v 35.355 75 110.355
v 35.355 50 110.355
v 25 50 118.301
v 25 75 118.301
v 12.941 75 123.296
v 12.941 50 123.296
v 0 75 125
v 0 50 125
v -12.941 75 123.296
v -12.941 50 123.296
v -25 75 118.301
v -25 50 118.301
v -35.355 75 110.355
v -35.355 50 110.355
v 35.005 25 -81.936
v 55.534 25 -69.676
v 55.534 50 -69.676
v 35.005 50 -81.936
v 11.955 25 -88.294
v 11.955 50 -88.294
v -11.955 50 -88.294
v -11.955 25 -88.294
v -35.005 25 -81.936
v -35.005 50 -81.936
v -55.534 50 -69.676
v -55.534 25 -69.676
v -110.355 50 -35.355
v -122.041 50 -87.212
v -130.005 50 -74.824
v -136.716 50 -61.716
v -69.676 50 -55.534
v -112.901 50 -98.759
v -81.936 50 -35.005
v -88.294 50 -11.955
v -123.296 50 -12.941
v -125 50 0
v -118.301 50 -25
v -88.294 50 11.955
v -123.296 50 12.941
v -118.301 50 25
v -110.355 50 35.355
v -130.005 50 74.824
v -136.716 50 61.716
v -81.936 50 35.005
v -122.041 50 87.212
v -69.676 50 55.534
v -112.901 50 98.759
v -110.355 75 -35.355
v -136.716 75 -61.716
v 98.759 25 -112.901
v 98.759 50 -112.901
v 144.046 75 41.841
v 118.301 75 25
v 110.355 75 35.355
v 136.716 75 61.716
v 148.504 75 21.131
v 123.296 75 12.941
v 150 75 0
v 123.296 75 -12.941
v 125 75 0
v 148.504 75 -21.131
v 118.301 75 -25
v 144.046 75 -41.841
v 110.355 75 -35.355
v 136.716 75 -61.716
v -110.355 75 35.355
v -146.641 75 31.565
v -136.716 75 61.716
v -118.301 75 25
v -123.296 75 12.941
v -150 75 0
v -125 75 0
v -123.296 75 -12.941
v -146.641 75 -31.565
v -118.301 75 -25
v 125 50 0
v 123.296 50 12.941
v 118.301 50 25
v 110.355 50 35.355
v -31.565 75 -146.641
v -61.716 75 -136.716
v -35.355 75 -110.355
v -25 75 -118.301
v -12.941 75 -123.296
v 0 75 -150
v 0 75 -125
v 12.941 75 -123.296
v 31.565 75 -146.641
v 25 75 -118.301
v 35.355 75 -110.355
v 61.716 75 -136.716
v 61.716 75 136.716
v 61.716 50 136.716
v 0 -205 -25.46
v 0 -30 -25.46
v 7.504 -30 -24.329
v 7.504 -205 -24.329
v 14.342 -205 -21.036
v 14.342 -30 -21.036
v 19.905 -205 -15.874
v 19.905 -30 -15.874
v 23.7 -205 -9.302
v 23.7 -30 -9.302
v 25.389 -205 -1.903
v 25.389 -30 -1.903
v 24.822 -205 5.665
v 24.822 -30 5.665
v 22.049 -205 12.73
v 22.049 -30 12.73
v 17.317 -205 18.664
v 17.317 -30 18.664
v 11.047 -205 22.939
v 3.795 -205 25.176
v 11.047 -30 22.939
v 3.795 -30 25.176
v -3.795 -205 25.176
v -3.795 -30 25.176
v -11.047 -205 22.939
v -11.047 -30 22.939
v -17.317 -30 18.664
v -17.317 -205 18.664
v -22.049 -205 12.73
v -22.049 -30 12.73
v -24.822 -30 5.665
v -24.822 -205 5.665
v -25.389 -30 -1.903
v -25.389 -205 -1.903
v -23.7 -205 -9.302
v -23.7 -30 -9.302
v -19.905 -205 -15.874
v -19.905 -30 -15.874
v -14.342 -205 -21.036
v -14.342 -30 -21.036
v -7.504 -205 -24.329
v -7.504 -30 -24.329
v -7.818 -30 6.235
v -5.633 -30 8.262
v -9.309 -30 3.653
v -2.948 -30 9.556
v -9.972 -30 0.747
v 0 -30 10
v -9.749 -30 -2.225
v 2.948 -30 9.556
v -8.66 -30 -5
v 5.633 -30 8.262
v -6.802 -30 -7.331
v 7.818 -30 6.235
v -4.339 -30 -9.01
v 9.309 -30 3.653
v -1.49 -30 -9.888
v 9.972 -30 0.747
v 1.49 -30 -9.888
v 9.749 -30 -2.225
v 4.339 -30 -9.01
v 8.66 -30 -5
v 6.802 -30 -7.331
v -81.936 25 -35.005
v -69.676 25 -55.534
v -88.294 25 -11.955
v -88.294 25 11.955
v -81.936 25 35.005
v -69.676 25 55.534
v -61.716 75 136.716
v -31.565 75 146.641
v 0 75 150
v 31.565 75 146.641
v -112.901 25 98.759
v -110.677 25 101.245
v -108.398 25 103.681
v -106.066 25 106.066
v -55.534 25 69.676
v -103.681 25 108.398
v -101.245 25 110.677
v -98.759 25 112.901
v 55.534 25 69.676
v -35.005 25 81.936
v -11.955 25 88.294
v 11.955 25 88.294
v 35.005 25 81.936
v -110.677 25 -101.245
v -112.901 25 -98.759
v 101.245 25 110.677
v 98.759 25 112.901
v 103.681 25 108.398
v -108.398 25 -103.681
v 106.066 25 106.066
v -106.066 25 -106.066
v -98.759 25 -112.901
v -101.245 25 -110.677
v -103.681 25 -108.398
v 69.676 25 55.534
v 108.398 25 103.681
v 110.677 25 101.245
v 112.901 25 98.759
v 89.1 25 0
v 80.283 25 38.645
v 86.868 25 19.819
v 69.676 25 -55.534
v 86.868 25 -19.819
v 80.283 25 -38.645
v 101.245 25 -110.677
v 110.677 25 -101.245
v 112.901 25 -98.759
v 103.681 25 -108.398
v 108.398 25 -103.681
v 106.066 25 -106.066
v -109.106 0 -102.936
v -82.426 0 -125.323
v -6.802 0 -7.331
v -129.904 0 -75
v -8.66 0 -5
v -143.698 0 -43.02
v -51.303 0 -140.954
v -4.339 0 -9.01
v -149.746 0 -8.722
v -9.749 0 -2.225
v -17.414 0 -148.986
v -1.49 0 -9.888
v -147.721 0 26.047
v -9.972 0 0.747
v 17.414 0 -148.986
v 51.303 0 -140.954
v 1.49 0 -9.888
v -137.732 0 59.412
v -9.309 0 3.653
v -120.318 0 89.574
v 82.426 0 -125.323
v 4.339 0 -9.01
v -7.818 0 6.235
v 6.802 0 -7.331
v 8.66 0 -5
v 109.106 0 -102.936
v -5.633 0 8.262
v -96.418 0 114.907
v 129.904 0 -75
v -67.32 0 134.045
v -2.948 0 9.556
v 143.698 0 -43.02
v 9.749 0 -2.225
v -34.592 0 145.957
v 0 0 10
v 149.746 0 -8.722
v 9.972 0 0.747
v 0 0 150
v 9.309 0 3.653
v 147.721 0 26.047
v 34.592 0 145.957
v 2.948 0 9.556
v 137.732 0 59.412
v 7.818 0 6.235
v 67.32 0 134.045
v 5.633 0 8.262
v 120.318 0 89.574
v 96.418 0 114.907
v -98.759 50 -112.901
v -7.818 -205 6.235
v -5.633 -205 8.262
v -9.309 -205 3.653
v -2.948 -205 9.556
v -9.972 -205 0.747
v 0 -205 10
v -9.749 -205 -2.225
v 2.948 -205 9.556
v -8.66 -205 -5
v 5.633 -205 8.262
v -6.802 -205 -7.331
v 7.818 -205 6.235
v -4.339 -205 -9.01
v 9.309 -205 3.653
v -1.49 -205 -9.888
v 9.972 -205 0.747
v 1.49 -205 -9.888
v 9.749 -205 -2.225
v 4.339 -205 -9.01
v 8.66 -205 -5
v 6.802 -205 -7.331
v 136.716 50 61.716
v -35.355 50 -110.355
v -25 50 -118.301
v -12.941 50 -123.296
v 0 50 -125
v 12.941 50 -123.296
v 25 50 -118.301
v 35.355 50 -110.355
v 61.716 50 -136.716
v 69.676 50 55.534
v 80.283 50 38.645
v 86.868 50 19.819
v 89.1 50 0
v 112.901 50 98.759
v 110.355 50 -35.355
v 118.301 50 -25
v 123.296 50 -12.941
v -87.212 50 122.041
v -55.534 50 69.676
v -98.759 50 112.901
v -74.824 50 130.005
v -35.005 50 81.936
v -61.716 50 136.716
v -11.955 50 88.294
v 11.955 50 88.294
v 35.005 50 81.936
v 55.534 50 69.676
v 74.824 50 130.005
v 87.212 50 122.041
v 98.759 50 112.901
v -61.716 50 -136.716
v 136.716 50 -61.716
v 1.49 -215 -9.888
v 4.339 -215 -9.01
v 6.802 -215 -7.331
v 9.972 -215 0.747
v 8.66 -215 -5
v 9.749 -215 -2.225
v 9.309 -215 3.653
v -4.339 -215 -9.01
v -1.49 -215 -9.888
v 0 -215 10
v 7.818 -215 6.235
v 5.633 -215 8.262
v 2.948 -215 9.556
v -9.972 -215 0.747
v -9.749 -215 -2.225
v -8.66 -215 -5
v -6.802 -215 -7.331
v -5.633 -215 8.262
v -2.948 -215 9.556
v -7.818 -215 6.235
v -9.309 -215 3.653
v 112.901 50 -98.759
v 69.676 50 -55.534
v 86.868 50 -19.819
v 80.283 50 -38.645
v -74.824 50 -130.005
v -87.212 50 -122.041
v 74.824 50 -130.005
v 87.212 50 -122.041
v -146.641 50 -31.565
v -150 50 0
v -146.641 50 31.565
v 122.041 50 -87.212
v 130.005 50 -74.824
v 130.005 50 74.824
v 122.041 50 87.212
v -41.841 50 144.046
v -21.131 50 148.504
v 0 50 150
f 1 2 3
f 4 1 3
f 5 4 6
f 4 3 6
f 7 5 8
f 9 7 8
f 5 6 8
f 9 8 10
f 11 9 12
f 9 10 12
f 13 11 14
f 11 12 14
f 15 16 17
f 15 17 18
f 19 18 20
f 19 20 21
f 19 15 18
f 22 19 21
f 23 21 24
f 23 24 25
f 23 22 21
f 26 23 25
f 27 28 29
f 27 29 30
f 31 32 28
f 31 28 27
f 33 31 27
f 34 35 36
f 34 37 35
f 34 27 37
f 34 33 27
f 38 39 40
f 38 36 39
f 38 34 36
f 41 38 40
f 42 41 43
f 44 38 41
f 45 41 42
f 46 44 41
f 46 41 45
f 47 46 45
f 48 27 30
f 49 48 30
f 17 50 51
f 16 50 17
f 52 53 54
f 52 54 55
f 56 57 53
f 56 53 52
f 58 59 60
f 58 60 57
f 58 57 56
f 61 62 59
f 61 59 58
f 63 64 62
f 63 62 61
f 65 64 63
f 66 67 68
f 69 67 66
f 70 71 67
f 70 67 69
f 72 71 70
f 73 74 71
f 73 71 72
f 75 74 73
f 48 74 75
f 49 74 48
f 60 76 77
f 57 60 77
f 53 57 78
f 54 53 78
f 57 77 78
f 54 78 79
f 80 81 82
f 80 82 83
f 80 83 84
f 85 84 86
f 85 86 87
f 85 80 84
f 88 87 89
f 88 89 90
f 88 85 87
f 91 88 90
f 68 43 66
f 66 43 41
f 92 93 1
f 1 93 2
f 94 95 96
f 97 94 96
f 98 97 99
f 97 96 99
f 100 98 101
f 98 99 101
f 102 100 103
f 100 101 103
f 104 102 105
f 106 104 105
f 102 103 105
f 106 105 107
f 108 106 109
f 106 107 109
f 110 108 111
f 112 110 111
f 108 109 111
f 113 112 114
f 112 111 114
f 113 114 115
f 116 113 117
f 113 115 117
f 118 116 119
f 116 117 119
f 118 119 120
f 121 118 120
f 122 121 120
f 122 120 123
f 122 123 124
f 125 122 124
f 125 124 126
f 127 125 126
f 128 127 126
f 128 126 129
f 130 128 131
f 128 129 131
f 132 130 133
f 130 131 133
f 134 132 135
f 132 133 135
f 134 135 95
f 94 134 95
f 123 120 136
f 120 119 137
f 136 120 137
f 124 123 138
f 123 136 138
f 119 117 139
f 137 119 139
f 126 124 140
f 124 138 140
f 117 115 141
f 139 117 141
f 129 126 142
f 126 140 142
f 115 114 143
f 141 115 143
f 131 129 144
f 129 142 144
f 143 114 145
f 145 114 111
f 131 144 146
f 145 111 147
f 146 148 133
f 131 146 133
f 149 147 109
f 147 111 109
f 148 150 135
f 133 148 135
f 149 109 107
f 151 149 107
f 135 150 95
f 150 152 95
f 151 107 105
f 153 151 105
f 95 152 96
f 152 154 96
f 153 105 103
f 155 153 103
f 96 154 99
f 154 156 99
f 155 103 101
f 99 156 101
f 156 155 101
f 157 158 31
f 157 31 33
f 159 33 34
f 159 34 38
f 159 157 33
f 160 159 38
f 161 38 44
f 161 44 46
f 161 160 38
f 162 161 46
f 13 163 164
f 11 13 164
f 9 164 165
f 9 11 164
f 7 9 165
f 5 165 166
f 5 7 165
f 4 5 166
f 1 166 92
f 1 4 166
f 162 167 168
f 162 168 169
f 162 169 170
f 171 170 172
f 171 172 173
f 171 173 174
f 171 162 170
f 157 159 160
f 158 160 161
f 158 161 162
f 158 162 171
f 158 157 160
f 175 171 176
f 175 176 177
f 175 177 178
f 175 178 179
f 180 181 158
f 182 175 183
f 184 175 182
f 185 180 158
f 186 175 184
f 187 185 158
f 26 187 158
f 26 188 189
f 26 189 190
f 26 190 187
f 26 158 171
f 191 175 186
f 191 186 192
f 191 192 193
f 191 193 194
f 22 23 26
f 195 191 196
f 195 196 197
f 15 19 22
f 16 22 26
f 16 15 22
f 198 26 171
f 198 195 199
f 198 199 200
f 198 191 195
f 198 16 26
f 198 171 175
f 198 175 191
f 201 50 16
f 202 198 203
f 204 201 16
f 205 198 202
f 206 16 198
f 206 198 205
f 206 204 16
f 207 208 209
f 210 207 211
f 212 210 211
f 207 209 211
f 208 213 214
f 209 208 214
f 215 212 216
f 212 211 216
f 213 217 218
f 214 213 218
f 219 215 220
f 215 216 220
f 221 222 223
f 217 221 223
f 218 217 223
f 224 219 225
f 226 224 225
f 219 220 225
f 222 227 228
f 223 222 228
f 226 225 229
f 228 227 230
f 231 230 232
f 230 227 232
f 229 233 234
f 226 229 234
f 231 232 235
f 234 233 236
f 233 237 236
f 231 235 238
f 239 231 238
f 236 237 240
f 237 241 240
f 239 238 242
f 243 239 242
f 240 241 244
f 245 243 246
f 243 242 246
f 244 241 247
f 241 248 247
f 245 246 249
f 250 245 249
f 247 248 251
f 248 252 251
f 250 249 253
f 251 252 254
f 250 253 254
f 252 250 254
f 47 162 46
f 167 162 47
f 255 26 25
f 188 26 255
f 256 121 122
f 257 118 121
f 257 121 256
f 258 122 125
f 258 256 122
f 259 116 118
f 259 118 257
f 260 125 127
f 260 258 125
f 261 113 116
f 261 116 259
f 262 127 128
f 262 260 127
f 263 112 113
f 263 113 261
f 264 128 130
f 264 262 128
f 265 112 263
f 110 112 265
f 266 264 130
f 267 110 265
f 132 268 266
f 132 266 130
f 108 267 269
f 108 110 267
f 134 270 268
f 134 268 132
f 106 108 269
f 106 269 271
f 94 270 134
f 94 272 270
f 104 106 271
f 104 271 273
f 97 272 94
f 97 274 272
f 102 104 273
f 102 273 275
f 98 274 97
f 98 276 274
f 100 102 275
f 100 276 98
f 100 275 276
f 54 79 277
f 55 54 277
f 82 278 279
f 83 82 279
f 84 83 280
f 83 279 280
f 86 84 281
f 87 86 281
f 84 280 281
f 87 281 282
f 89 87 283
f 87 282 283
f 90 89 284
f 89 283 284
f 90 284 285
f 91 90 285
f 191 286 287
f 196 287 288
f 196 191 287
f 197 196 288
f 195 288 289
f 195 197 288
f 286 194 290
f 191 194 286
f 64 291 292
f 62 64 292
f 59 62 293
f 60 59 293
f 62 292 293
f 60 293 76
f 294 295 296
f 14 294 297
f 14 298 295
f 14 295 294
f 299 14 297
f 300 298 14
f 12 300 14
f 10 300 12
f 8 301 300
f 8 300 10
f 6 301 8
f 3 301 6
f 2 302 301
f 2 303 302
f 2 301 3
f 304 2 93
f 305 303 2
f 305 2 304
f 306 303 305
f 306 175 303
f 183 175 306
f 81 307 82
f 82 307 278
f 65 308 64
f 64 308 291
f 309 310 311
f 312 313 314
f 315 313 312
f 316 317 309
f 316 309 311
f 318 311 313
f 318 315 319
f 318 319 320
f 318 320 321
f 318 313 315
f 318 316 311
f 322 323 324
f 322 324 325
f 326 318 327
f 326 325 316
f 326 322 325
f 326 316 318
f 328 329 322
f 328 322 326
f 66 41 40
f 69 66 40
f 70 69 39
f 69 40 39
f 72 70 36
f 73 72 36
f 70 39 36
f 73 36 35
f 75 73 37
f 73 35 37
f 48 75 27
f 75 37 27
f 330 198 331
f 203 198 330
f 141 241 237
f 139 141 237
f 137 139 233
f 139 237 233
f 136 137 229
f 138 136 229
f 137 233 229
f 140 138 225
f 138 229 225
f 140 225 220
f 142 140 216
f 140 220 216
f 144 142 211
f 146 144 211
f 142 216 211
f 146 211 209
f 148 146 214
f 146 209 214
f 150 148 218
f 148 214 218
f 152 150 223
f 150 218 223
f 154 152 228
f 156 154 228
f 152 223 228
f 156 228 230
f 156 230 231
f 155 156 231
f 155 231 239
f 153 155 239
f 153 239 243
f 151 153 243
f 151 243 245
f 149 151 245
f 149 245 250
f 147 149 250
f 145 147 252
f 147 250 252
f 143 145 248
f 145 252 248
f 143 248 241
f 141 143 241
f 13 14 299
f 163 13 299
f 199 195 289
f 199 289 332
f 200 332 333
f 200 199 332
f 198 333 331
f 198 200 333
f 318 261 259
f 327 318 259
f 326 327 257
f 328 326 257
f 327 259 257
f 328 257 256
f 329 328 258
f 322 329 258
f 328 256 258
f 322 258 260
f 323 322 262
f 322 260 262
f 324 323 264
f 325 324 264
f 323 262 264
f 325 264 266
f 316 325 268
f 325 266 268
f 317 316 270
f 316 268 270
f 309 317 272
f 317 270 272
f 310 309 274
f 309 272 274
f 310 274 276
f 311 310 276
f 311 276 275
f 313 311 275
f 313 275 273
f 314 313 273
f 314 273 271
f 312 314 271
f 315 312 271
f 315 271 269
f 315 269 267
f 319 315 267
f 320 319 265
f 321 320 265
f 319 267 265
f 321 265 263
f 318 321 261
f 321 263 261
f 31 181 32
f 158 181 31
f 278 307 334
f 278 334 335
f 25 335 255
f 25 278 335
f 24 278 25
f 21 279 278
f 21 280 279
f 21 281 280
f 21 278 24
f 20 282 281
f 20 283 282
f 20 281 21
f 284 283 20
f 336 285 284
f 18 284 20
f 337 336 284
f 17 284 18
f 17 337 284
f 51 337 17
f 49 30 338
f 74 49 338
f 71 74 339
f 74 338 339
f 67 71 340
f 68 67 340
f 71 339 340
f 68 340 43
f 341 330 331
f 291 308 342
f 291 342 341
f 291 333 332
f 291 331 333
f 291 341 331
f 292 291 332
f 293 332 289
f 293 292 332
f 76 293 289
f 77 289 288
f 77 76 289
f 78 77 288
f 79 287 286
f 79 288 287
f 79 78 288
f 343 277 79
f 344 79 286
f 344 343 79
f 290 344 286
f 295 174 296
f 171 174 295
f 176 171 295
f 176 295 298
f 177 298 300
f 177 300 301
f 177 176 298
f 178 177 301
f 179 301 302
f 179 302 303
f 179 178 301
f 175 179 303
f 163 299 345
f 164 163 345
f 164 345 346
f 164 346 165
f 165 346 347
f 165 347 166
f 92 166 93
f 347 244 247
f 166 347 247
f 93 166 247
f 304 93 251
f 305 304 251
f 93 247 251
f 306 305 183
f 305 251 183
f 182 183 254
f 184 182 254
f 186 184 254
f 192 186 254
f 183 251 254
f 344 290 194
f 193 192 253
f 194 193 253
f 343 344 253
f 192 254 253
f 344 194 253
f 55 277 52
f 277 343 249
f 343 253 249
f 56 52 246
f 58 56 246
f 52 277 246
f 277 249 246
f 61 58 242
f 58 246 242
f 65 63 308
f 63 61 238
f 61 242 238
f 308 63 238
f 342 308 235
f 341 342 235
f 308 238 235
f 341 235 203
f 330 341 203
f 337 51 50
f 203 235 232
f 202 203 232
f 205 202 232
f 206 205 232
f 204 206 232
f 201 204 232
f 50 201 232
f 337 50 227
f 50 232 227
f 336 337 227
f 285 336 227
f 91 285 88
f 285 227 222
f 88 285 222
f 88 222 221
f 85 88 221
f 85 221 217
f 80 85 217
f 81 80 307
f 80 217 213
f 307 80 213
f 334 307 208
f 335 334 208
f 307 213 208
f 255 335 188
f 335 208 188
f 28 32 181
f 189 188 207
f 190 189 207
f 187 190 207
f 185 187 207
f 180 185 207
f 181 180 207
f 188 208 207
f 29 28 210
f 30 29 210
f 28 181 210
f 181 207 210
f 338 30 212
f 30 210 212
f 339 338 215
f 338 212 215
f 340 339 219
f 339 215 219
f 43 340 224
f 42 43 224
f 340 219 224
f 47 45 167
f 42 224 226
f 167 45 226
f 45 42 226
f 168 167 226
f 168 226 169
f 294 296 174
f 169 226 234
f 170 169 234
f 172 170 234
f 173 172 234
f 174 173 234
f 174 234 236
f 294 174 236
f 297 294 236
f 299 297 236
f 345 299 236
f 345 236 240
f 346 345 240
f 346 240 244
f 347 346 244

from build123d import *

# Parameters (mm, degrees)
SKETCH_1_R          = 150
EXTRUDE_1_DEPTH     = 50
CUT_EXTRUDE_START   = -25
CUT_EXTRUDE_1_DEPTH = 25
EXTRUDE_2_DEPTH     = 25
SKETCH_4_R          = 10
EXTRUDE_3_DEPTH     = 30
SKETCH_5_R          = 25.46
EXTRUDE_4_DEPTH     = 175
SKETCH_6_R          = 10
EXTRUDE_5_DEPTH     = 10


with BuildPart() as part:
    # 草图1 → 凸台-拉伸1 (new body)
    with BuildSketch(Plane(origin=(0, 0, 0), x_dir=(1, 0, 0), z_dir=(0, 1, 0))):
        with Locations(Location((0, 0, 0), (0, 0, 270))):
            Circle(SKETCH_1_R)
    extrude(amount=EXTRUDE_1_DEPTH)

    # 草图2 → 切除-拉伸1 (cut)
    with BuildSketch(Plane(origin=(0, 50, 0), x_dir=(1, 0, 0), z_dir=(0, 1, 0)).offset(CUT_EXTRUDE_START)):
        with BuildLine():
            Line((106.066017178, -106.066017178), (63.003214204, -63.003214204))
            ThreePointArc((63.003214204, -63.003214204), (59.362488155, -66.444751486), (55.534083733, -69.676219357))
            Line((55.534083733, -69.676219357), (98.758984631, -112.901120254))
            ThreePointArc((98.758984631, -112.901120254), (102.46950766, -109.544511501), (106.066017178, -106.066017178))
        make_face()
        with BuildLine():
            ThreePointArc((69.676219357, -55.534083733), (66.444751486, -59.362488155), (63.003214204, -63.003214204))
            Line((63.003214204, -63.003214204), (106.066017178, -106.066017178))
            ThreePointArc((106.066017178, -106.066017178), (109.544511501, -102.46950766), (112.901120254, -98.758984631))
            Line((112.901120254, -98.758984631), (69.676219357, -55.534083733))
        make_face()
        with BuildLine():
            Line((14.142135624, 0), (7.071067812, -7.071067812))
            Line((7.071067812, -7.071067812), (63.003214204, -63.003214204))
            ThreePointArc((63.003214204, -63.003214204), (66.444751486, -59.362488155), (69.676219357, -55.534083733))
            Line((69.676219357, -55.534083733), (14.142135624, 0))
        make_face()
        with BuildLine():
            Line((63.003214204, -63.003214204), (7.071067812, -7.071067812))
            Line((7.071067812, -7.071067812), (0, -14.142135624))
            Line((0, -14.142135624), (55.534083733, -69.676219357))
            ThreePointArc((55.534083733, -69.676219357), (59.362488155, -66.444751486), (63.003214204, -63.003214204))
        make_face()
        with BuildLine():
            Line((55.534083733, -69.676219357), (0, -14.142135624))
            Line((0, -14.142135624), (-55.534083733, -69.676219357))
            ThreePointArc((-55.534083733, -69.676219357), (0, -89.1), (55.534083733, -69.676219357))
        make_face()
        with BuildLine():
            Line((0, -14.142135624), (-7.071067812, -7.071067812))
            Line((-7.071067812, -7.071067812), (-63.003214204, -63.003214204))
            ThreePointArc((-63.003214204, -63.003214204), (-59.362488155, -66.444751486), (-55.534083733, -69.676219357))
            Line((-55.534083733, -69.676219357), (0, -14.142135624))
        make_face()
        with BuildLine():
            Line((-63.003214204, -63.003214204), (-7.071067812, -7.071067812))
            Line((-7.071067812, -7.071067812), (-14.142135624, 0))
            Line((-14.142135624, 0), (-69.676219357, -55.534083733))
            ThreePointArc((-69.676219357, -55.534083733), (-66.444751486, -59.362488155), (-63.003214204, -63.003214204))
        make_face()
        with BuildLine():
            Line((106.066017178, 106.066017178), (63.003214204, 63.003214204))
            ThreePointArc((63.003214204, 63.003214204), (66.444751486, 59.362488155), (69.676219357, 55.534083733))
            Line((69.676219357, 55.534083733), (112.901120254, 98.758984631))
            ThreePointArc((112.901120254, 98.758984631), (109.544511501, 102.46950766), (106.066017178, 106.066017178))
        make_face()
        with BuildLine():
            ThreePointArc((-55.534083733, -69.676219357), (-59.362488155, -66.444751486), (-63.003214204, -63.003214204))
            Line((-63.003214204, -63.003214204), (-106.066017178, -106.066017178))
            ThreePointArc((-106.066017178, -106.066017178), (-102.46950766, -109.544511501), (-98.758984631, -112.901120254))
            Line((-98.758984631, -112.901120254), (-55.534083733, -69.676219357))
        make_face()
        with BuildLine():
            ThreePointArc((55.534083733, 69.676219357), (59.362488155, 66.444751486), (63.003214204, 63.003214204))
            Line((63.003214204, 63.003214204), (106.066017178, 106.066017178))
            ThreePointArc((106.066017178, 106.066017178), (102.46950766, 109.544511501), (98.758984631, 112.901120254))
            Line((98.758984631, 112.901120254), (55.534083733, 69.676219357))
        make_face()
        with BuildLine():
            Line((-106.066017178, -106.066017178), (-63.003214204, -63.003214204))
            ThreePointArc((-63.003214204, -63.003214204), (-66.444751486, -59.362488155), (-69.676219357, -55.534083733))
            Line((-69.676219357, -55.534083733), (-112.901120254, -98.758984631))
            ThreePointArc((-112.901120254, -98.758984631), (-109.544511501, -102.46950766), (-106.066017178, -106.066017178))
        make_face()
        with BuildLine():
            Line((-69.676219357, -55.534083733), (-14.142135624, 0))
            Line((-14.142135624, 0), (-69.676219357, 55.534083733))
            ThreePointArc((-69.676219357, 55.534083733), (-89.1, 0), (-69.676219357, -55.534083733))
        make_face()
        with BuildLine():
            Line((-14.142135624, 0), (-7.071067812, 7.071067812))
            Line((-7.071067812, 7.071067812), (-63.003214204, 63.003214204))
            ThreePointArc((-63.003214204, 63.003214204), (-66.444751486, 59.362488155), (-69.676219357, 55.534083733))
            Line((-69.676219357, 55.534083733), (-14.142135624, 0))
        make_face()
        with BuildLine():
            Line((-63.003214204, 63.003214204), (-7.071067812, 7.071067812))
            Line((-7.071067812, 7.071067812), (0, 14.142135624))
            Line((0, 14.142135624), (-55.534083733, 69.676219357))
            ThreePointArc((-55.534083733, 69.676219357), (-59.362488155, 66.444751486), (-63.003214204, 63.003214204))
        make_face()
        Polygon((7.071067812, -7.071067812), (0, 0), (-7.071067812, -7.071067812), (0, -14.142135624), align=None)
        Polygon((-7.071067812, -7.071067812), (0, 0), (-7.071067812, 7.071067812), (-14.142135624, 0), align=None)
        Polygon((7.071067812, 7.071067812), (0, 0), (14.142135624, 0), align=None)
        Polygon((14.142135624, 0), (0, 0), (7.071067812, -7.071067812), align=None)
        Polygon((-7.071067812, 7.071067812), (0, 0), (7.071067812, 7.071067812), (0, 14.142135624), align=None)
        with BuildLine():
            Line((0, 14.142135624), (7.071067812, 7.071067812))
            Line((7.071067812, 7.071067812), (63.003214204, 63.003214204))
            ThreePointArc((63.003214204, 63.003214204), (59.362488155, 66.444751486), (55.534083733, 69.676219357))
            Line((55.534083733, 69.676219357), (0, 14.142135624))
        make_face()
        with BuildLine():
            Line((63.003214204, 63.003214204), (7.071067812, 7.071067812))
            Line((7.071067812, 7.071067812), (14.142135624, 0))
            Line((14.142135624, 0), (69.676219357, 55.534083733))
            ThreePointArc((69.676219357, 55.534083733), (66.444751486, 59.362488155), (63.003214204, 63.003214204))
        make_face()
        with BuildLine():
            ThreePointArc((-69.676219357, 55.534083733), (-66.444751486, 59.362488155), (-63.003214204, 63.003214204))
            Line((-63.003214204, 63.003214204), (-106.066017178, 106.066017178))
            ThreePointArc((-106.066017178, 106.066017178), (-109.544511501, 102.46950766), (-112.901120254, 98.758984631))
            Line((-112.901120254, 98.758984631), (-69.676219357, 55.534083733))
        make_face()
        with BuildLine():
            Line((-106.066017178, 106.066017178), (-63.003214204, 63.003214204))
            ThreePointArc((-63.003214204, 63.003214204), (-59.362488155, 66.444751486), (-55.534083733, 69.676219357))
            Line((-55.534083733, 69.676219357), (-98.758984631, 112.901120254))
            ThreePointArc((-98.758984631, 112.901120254), (-102.46950766, 109.544511501), (-106.066017178, 106.066017178))
        make_face()
        with BuildLine():
            Line((69.676219357, 55.534083733), (14.142135624, 0))
            Line((14.142135624, 0), (89.1, 0))
            ThreePointArc((89.1, 0), (84.103986662, 29.416482245), (69.676219357, 55.534083733))
        make_face()
        with BuildLine():
            Line((89.1, 0), (14.142135624, 0))
            Line((14.142135624, 0), (69.676219357, -55.534083733))
            ThreePointArc((69.676219357, -55.534083733), (84.103986662, -29.416482245), (89.1, 0))
        make_face()
        with BuildLine():
            Line((-55.534083733, 69.676219357), (0, 14.142135624))
            Line((0, 14.142135624), (55.534083733, 69.676219357))
            ThreePointArc((55.534083733, 69.676219357), (0, 89.1), (-55.534083733, 69.676219357))
        make_face()
    extrude(amount=CUT_EXTRUDE_1_DEPTH, mode=Mode.SUBTRACT)

    # 草图3 → 凸台-拉伸2 (add)
    with BuildSketch(Plane(origin=(0, 50, 0), x_dir=(1, 0, 0), z_dir=(0, 1, 0))):
        with BuildLine():
            Line((-136.715674165, -61.715674165), (-110.355339059, -35.355339059))
            ThreePointArc((-110.355339059, -35.355339059), (-125, 0), (-110.355339059, 35.355339059))
            Line((-110.355339059, 35.355339059), (-136.715674165, 61.715674165))
            ThreePointArc((-136.715674165, 61.715674165), (-150, 0), (-136.715674165, -61.715674165))
        make_face()
        with BuildLine():
            Line((35.355339059, 110.355339059), (61.715674165, 136.715674165))
            ThreePointArc((61.715674165, 136.715674165), (0, 150), (-61.715674165, 136.715674165))
            Line((-61.715674165, 136.715674165), (-35.355339059, 110.355339059))
            ThreePointArc((-35.355339059, 110.355339059), (0, 125), (35.355339059, 110.355339059))
        make_face()
        with BuildLine():
            Line((136.715674165, 61.715674165), (110.355339059, 35.355339059))
            ThreePointArc((110.355339059, 35.355339059), (121.193976626, 19.134171618), (125, 0))
            ThreePointArc((125, 0), (121.193976626, -19.134171618), (110.355339059, -35.355339059))
            Line((110.355339059, -35.355339059), (136.715674165, -61.715674165))
            ThreePointArc((136.715674165, -61.715674165), (146.641316014, -31.564607357), (150, 0))
            ThreePointArc((150, 0), (146.641316014, 31.564607357), (136.715674165, 61.715674165))
        make_face()
        with BuildLine():
            Line((61.715674165, -136.715674165), (35.355339059, -110.355339059))
            ThreePointArc((35.355339059, -110.355339059), (0, -125), (-35.355339059, -110.355339059))
            Line((-35.355339059, -110.355339059), (-61.715674165, -136.715674165))
            ThreePointArc((-61.715674165, -136.715674165), (0, -150), (61.715674165, -136.715674165))
        make_face()
    extrude(amount=EXTRUDE_2_DEPTH)

    # 草图4 → 凸台-拉伸3 (add)
    with BuildSketch(Plane.XZ):
        with Locations(Location((0, 0, 0), (0, 0, 90))):
            Circle(SKETCH_4_R)
    extrude(amount=EXTRUDE_3_DEPTH)

    # 草图5 → 凸台-拉伸4 (add)
    with BuildSketch(Plane.XZ.offset(30)):
        with Locations(Location((0, 0, 0), (0, 0, 270))):
            Circle(SKETCH_5_R)
    extrude(amount=EXTRUDE_4_DEPTH)

    # 草图6 → 凸台-拉伸5 (add)
    with BuildSketch(Plane.XZ.offset(205)):
        with Locations(Location((0, 0, 0), (0, 0, 90))):
            Circle(SKETCH_6_R)
    extrude(amount=EXTRUDE_5_DEPTH)


solid = part.part
